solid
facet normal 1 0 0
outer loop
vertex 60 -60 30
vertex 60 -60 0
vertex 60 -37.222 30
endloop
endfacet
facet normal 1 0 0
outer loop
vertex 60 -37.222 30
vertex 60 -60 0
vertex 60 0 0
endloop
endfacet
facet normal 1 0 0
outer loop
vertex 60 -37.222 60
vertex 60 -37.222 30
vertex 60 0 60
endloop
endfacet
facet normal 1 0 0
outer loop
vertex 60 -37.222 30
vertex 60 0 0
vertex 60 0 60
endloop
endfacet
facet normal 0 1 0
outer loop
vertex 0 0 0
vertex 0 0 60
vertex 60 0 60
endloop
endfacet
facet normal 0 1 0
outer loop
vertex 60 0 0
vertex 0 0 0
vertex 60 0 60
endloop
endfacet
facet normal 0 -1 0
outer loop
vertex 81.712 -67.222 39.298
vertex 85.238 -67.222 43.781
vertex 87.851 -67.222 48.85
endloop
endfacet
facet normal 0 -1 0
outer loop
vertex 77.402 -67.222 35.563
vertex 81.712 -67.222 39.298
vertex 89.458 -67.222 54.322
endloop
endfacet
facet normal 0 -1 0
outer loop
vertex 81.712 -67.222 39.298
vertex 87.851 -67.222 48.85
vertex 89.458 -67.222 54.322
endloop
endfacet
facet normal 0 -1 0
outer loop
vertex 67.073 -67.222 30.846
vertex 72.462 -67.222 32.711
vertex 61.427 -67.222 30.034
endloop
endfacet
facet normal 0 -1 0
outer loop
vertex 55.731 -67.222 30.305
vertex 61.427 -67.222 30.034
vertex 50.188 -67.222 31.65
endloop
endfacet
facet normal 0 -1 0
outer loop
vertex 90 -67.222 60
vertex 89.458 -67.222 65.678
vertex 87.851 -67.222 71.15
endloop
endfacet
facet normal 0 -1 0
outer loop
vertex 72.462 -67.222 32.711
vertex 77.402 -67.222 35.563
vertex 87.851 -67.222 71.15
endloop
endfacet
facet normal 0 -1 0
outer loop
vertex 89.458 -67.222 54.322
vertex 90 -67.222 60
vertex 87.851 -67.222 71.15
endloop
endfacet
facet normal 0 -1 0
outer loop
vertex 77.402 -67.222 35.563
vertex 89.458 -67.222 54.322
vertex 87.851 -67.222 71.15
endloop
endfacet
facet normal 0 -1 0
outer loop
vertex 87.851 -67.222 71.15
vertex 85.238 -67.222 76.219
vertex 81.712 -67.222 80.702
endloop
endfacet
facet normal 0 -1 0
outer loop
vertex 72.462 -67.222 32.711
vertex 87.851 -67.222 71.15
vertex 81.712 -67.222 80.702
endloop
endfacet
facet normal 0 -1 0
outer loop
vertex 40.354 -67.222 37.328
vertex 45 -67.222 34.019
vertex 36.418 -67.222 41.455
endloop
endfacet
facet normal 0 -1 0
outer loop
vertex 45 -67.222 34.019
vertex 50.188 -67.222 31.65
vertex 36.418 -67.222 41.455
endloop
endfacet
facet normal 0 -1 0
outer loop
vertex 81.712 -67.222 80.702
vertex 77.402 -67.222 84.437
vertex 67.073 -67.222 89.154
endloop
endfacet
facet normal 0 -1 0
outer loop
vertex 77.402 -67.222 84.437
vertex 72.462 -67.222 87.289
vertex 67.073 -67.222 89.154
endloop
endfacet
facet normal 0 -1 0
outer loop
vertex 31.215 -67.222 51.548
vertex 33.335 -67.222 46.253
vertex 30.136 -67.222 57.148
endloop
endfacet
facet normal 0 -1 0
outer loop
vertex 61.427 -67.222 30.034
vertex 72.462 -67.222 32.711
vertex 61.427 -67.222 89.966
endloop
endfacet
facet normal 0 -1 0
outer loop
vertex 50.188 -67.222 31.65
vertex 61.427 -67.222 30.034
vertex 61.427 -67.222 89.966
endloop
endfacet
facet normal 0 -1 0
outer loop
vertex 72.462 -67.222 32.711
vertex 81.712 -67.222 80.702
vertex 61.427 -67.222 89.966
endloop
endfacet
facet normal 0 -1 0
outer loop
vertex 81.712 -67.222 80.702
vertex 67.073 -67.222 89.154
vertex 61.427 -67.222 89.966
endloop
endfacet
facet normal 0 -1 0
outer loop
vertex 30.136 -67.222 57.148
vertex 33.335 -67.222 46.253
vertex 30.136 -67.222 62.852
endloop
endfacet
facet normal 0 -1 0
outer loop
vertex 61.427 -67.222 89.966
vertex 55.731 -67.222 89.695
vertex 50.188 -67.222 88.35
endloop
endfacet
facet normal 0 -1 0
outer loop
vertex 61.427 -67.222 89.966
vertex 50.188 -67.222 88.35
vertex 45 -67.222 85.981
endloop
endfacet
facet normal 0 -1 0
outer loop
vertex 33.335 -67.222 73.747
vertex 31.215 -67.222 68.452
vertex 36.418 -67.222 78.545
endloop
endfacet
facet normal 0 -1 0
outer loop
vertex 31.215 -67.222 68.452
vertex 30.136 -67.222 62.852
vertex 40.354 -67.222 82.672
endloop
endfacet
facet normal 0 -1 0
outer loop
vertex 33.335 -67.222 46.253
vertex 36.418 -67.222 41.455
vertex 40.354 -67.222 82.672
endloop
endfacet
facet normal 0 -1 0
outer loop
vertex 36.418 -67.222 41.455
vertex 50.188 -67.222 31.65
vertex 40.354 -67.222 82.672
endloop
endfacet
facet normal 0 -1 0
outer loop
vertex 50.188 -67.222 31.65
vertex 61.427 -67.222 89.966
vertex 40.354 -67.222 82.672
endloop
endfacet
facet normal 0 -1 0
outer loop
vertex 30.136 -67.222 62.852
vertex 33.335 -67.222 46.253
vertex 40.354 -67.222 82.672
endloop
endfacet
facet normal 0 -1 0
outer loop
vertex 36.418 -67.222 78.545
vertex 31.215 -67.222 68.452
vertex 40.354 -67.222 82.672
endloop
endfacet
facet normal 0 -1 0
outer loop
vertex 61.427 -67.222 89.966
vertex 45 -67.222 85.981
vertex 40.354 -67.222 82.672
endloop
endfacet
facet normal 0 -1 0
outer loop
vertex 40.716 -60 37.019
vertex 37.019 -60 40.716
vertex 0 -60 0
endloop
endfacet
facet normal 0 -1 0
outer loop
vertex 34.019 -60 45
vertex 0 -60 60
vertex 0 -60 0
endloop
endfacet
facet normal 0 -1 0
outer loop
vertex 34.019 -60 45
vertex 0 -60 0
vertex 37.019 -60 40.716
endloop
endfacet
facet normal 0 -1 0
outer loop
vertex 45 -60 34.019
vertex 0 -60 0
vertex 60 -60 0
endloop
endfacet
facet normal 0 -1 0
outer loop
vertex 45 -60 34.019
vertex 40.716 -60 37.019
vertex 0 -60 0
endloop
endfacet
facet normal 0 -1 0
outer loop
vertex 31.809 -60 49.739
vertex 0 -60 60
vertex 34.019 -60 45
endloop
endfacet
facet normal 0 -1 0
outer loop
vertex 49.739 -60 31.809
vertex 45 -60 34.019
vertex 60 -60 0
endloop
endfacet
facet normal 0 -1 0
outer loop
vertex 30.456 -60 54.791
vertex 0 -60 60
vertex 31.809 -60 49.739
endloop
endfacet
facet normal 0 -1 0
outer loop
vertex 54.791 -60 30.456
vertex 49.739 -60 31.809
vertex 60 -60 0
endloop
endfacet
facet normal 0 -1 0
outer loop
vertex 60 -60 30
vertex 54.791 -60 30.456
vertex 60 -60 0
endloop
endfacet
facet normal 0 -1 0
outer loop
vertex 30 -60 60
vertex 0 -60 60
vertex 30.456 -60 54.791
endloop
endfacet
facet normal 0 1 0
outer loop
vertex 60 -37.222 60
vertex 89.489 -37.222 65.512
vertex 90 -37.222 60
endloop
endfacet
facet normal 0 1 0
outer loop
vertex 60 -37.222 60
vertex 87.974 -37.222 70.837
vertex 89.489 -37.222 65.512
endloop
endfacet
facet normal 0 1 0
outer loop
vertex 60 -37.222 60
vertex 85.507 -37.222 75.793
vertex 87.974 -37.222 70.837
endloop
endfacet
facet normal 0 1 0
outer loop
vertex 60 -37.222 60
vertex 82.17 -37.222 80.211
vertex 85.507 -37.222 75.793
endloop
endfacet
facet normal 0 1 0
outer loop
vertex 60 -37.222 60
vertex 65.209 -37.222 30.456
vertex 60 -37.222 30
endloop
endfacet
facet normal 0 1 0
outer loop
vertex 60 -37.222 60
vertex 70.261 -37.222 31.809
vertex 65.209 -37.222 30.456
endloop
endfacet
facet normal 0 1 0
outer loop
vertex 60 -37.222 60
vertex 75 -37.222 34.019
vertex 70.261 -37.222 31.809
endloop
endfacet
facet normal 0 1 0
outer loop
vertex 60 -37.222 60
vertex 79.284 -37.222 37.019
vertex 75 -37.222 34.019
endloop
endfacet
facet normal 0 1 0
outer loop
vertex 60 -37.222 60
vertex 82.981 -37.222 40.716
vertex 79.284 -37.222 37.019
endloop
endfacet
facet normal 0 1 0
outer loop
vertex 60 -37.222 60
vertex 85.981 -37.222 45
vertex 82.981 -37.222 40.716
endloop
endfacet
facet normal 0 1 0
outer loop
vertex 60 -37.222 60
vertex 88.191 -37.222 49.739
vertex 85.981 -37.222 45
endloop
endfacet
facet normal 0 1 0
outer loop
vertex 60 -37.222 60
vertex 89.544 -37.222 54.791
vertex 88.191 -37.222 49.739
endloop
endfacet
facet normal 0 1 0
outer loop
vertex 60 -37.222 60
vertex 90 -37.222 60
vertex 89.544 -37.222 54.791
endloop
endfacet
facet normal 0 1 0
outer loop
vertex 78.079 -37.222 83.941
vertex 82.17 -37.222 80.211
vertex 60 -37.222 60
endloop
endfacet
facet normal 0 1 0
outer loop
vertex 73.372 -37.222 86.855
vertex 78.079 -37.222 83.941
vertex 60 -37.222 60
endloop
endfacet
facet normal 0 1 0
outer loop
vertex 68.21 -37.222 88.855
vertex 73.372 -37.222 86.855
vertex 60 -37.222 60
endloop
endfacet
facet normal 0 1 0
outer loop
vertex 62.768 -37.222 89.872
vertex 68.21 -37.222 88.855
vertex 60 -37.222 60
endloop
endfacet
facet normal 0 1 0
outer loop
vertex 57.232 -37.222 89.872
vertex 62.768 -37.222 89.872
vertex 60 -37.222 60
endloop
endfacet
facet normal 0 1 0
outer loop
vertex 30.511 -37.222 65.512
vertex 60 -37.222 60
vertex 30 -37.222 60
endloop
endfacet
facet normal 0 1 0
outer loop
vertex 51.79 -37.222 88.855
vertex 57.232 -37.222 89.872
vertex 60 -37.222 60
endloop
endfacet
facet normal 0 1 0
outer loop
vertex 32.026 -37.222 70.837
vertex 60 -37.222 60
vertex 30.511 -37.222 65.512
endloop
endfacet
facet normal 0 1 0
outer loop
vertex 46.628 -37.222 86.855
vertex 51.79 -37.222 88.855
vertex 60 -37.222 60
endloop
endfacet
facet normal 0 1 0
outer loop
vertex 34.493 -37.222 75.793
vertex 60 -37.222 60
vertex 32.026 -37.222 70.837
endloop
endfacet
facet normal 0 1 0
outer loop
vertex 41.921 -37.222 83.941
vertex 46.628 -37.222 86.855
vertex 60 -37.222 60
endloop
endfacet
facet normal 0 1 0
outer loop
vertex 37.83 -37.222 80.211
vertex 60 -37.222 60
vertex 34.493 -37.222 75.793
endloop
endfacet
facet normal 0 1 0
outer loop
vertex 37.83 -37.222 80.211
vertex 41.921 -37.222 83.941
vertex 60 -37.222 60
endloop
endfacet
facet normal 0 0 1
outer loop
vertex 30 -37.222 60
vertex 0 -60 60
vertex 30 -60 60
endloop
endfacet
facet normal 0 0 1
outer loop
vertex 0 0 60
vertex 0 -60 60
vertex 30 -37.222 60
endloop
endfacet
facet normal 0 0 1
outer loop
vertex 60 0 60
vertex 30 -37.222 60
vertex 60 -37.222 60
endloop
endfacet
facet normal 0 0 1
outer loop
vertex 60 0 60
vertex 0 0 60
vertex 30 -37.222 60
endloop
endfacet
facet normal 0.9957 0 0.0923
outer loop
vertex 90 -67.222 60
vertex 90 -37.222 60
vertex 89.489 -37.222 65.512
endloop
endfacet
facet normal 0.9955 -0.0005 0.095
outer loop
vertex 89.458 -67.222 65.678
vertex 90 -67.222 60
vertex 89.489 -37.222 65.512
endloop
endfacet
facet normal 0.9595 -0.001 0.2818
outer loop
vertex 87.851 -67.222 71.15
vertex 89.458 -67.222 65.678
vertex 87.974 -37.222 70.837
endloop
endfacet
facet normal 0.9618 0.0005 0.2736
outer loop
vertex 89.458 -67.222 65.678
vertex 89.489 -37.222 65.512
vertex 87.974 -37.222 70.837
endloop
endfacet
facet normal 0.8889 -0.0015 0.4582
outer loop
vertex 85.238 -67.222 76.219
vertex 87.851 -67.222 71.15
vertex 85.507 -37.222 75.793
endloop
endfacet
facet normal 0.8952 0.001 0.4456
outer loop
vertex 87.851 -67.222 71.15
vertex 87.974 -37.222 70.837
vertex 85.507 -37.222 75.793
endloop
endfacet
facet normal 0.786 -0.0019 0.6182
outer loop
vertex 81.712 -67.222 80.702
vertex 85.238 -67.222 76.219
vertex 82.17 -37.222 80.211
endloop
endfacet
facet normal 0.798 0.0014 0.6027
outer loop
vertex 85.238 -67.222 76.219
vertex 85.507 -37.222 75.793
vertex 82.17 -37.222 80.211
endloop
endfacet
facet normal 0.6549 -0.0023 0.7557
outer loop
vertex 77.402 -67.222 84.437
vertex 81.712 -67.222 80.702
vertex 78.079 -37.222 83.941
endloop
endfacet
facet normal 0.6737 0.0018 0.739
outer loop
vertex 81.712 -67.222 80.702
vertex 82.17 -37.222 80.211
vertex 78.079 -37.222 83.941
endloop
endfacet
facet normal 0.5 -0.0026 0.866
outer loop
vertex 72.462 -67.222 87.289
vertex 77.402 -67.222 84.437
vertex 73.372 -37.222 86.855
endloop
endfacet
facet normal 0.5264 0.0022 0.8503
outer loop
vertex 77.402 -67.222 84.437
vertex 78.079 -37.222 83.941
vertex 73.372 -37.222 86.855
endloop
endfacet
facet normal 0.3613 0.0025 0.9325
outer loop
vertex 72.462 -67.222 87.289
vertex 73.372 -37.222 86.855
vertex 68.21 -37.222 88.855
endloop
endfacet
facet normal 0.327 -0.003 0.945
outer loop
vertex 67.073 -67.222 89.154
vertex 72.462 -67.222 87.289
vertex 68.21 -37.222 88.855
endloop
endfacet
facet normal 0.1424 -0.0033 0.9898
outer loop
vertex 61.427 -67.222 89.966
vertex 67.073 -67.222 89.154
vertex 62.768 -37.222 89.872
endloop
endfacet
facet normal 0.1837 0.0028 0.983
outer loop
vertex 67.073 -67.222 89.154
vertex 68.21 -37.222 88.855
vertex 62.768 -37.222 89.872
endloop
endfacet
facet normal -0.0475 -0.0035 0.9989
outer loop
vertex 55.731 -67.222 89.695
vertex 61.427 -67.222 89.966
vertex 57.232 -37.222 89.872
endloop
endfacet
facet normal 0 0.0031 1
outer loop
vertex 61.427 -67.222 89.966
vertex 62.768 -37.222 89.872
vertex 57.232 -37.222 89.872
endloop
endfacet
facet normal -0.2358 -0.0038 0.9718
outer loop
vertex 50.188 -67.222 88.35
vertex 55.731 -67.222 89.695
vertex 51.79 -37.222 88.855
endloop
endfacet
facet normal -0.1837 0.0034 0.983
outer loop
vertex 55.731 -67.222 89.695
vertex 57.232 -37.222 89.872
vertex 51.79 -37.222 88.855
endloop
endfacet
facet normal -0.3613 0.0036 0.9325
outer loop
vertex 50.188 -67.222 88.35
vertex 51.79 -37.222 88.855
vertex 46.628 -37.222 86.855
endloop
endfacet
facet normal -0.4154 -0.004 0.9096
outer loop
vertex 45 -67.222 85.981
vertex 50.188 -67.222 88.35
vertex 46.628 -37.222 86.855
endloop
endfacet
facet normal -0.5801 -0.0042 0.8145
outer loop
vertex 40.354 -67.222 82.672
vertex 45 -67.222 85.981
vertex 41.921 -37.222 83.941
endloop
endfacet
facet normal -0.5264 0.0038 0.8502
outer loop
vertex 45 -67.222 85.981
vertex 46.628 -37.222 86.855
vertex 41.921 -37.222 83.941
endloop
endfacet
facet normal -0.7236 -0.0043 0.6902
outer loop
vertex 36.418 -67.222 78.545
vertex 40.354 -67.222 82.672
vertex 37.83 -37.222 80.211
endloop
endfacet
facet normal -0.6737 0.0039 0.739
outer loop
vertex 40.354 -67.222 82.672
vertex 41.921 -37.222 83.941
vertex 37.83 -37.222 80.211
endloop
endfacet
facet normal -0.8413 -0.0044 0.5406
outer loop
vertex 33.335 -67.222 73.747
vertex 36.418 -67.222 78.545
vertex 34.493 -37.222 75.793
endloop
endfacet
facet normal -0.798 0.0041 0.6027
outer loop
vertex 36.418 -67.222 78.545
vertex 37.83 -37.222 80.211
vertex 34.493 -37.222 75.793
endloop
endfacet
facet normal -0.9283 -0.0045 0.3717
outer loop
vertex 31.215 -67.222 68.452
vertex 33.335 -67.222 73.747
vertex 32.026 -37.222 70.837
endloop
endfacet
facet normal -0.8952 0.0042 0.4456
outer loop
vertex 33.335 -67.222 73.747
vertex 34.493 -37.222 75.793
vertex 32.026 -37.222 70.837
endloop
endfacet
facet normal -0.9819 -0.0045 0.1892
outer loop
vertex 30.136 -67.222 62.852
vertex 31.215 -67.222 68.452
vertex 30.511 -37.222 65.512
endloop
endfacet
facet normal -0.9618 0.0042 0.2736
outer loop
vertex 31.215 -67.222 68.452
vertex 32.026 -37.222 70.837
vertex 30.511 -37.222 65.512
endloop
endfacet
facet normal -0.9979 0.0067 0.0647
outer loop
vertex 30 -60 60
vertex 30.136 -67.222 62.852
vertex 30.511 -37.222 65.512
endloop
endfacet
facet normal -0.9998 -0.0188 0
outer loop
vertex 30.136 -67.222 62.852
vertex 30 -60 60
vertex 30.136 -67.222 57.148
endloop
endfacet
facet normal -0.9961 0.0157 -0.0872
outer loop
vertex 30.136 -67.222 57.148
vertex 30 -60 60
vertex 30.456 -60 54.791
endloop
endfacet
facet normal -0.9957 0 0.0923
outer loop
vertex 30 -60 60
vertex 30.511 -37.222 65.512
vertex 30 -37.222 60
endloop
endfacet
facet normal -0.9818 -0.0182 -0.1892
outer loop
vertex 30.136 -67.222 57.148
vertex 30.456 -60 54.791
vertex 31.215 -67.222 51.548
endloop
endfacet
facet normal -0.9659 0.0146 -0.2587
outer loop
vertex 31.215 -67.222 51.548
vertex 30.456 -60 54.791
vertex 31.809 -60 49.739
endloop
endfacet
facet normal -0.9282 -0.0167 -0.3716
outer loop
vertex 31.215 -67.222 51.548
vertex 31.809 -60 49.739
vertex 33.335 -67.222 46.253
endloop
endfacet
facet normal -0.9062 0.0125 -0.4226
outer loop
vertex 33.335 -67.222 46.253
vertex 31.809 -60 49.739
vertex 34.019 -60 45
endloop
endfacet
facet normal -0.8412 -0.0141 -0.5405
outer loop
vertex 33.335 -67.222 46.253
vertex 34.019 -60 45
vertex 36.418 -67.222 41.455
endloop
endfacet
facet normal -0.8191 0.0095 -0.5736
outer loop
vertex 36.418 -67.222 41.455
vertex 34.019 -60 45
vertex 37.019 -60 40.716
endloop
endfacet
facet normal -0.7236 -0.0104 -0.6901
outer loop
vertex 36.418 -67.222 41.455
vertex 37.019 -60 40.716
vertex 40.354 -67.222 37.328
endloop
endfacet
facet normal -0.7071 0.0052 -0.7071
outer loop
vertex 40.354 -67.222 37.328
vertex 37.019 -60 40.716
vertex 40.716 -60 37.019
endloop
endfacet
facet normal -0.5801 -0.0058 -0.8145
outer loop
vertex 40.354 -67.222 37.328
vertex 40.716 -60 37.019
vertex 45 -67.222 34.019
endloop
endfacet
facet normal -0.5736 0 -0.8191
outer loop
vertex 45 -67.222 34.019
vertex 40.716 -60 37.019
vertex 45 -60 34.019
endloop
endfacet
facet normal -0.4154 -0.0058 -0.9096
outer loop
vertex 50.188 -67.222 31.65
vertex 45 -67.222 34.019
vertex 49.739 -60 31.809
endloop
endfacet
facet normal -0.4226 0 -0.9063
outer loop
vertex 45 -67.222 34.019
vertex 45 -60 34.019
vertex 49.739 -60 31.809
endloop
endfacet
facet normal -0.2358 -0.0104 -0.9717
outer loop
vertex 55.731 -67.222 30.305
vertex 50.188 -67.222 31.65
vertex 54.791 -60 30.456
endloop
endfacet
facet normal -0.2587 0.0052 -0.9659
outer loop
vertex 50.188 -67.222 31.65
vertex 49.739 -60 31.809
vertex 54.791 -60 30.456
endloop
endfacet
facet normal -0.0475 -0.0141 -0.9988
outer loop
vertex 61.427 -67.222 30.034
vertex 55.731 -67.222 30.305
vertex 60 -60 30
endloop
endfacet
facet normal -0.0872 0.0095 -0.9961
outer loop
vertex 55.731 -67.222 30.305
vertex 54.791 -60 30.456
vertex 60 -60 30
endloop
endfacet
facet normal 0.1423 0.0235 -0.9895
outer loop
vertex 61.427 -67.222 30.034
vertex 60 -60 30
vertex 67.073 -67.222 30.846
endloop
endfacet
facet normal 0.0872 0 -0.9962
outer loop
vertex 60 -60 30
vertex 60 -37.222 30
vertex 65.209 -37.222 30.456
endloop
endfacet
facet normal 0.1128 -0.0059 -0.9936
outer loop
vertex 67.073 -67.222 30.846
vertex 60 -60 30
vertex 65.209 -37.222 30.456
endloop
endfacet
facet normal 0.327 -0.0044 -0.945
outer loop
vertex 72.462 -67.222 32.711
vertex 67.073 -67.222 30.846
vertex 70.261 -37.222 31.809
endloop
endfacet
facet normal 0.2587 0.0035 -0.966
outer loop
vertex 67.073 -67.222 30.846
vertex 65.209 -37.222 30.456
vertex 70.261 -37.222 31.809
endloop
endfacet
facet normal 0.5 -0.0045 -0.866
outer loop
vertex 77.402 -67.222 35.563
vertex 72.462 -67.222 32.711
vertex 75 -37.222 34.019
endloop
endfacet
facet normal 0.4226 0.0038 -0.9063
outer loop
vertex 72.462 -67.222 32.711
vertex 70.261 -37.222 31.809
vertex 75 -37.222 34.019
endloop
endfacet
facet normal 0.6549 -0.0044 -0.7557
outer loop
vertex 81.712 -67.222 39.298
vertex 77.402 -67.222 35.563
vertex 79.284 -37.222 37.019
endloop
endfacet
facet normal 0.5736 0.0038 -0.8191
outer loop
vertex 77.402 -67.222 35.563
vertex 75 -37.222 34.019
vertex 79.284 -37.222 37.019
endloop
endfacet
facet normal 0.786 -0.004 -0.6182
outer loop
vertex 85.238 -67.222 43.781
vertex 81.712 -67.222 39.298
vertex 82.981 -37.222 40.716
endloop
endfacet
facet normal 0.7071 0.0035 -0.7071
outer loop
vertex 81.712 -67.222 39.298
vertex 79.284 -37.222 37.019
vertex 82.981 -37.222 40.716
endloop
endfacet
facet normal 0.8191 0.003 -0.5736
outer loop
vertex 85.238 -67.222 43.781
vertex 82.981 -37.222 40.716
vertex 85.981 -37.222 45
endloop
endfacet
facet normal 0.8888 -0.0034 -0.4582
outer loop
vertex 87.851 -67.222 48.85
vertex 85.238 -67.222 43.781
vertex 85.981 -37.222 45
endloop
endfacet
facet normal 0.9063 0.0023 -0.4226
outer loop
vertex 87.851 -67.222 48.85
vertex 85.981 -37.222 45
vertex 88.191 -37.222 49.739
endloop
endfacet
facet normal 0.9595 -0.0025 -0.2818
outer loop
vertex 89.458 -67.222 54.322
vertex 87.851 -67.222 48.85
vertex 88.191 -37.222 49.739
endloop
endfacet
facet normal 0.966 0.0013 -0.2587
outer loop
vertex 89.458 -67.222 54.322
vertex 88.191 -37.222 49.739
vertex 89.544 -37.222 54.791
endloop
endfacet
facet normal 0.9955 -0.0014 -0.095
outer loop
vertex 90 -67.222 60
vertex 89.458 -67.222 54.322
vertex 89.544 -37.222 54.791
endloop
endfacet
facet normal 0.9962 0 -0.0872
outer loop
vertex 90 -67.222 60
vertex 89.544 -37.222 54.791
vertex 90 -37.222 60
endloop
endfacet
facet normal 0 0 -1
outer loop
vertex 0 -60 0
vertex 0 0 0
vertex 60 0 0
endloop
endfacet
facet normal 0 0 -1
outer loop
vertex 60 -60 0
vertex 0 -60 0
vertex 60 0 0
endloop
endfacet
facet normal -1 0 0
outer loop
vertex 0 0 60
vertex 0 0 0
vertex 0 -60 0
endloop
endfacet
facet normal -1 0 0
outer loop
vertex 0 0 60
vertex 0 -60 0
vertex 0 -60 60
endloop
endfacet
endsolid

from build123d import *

# Parameters (mm, degrees)
F0_W     = 60
F0_H     = 60
F1_DEPTH = 60
F2_W     = 30
F2_H     = 30


with BuildPart() as f1:
    # F0 (on Front) → F1 (new body)
    with BuildSketch(Plane.XZ):
        with Locations((30, 30)):
            Rectangle(F0_W, F0_H)
    extrude(amount=F1_DEPTH)

    # F2 (on face) → F3 (revolve)
    with BuildSketch(Plane.XY.offset(60)):
        with Locations((75, -52.221692)):
            Rectangle(F2_W, F2_H)
    revolve(axis=Axis((60, -52.221692, 60), (0, -1, 0)))


solid = f1.part
